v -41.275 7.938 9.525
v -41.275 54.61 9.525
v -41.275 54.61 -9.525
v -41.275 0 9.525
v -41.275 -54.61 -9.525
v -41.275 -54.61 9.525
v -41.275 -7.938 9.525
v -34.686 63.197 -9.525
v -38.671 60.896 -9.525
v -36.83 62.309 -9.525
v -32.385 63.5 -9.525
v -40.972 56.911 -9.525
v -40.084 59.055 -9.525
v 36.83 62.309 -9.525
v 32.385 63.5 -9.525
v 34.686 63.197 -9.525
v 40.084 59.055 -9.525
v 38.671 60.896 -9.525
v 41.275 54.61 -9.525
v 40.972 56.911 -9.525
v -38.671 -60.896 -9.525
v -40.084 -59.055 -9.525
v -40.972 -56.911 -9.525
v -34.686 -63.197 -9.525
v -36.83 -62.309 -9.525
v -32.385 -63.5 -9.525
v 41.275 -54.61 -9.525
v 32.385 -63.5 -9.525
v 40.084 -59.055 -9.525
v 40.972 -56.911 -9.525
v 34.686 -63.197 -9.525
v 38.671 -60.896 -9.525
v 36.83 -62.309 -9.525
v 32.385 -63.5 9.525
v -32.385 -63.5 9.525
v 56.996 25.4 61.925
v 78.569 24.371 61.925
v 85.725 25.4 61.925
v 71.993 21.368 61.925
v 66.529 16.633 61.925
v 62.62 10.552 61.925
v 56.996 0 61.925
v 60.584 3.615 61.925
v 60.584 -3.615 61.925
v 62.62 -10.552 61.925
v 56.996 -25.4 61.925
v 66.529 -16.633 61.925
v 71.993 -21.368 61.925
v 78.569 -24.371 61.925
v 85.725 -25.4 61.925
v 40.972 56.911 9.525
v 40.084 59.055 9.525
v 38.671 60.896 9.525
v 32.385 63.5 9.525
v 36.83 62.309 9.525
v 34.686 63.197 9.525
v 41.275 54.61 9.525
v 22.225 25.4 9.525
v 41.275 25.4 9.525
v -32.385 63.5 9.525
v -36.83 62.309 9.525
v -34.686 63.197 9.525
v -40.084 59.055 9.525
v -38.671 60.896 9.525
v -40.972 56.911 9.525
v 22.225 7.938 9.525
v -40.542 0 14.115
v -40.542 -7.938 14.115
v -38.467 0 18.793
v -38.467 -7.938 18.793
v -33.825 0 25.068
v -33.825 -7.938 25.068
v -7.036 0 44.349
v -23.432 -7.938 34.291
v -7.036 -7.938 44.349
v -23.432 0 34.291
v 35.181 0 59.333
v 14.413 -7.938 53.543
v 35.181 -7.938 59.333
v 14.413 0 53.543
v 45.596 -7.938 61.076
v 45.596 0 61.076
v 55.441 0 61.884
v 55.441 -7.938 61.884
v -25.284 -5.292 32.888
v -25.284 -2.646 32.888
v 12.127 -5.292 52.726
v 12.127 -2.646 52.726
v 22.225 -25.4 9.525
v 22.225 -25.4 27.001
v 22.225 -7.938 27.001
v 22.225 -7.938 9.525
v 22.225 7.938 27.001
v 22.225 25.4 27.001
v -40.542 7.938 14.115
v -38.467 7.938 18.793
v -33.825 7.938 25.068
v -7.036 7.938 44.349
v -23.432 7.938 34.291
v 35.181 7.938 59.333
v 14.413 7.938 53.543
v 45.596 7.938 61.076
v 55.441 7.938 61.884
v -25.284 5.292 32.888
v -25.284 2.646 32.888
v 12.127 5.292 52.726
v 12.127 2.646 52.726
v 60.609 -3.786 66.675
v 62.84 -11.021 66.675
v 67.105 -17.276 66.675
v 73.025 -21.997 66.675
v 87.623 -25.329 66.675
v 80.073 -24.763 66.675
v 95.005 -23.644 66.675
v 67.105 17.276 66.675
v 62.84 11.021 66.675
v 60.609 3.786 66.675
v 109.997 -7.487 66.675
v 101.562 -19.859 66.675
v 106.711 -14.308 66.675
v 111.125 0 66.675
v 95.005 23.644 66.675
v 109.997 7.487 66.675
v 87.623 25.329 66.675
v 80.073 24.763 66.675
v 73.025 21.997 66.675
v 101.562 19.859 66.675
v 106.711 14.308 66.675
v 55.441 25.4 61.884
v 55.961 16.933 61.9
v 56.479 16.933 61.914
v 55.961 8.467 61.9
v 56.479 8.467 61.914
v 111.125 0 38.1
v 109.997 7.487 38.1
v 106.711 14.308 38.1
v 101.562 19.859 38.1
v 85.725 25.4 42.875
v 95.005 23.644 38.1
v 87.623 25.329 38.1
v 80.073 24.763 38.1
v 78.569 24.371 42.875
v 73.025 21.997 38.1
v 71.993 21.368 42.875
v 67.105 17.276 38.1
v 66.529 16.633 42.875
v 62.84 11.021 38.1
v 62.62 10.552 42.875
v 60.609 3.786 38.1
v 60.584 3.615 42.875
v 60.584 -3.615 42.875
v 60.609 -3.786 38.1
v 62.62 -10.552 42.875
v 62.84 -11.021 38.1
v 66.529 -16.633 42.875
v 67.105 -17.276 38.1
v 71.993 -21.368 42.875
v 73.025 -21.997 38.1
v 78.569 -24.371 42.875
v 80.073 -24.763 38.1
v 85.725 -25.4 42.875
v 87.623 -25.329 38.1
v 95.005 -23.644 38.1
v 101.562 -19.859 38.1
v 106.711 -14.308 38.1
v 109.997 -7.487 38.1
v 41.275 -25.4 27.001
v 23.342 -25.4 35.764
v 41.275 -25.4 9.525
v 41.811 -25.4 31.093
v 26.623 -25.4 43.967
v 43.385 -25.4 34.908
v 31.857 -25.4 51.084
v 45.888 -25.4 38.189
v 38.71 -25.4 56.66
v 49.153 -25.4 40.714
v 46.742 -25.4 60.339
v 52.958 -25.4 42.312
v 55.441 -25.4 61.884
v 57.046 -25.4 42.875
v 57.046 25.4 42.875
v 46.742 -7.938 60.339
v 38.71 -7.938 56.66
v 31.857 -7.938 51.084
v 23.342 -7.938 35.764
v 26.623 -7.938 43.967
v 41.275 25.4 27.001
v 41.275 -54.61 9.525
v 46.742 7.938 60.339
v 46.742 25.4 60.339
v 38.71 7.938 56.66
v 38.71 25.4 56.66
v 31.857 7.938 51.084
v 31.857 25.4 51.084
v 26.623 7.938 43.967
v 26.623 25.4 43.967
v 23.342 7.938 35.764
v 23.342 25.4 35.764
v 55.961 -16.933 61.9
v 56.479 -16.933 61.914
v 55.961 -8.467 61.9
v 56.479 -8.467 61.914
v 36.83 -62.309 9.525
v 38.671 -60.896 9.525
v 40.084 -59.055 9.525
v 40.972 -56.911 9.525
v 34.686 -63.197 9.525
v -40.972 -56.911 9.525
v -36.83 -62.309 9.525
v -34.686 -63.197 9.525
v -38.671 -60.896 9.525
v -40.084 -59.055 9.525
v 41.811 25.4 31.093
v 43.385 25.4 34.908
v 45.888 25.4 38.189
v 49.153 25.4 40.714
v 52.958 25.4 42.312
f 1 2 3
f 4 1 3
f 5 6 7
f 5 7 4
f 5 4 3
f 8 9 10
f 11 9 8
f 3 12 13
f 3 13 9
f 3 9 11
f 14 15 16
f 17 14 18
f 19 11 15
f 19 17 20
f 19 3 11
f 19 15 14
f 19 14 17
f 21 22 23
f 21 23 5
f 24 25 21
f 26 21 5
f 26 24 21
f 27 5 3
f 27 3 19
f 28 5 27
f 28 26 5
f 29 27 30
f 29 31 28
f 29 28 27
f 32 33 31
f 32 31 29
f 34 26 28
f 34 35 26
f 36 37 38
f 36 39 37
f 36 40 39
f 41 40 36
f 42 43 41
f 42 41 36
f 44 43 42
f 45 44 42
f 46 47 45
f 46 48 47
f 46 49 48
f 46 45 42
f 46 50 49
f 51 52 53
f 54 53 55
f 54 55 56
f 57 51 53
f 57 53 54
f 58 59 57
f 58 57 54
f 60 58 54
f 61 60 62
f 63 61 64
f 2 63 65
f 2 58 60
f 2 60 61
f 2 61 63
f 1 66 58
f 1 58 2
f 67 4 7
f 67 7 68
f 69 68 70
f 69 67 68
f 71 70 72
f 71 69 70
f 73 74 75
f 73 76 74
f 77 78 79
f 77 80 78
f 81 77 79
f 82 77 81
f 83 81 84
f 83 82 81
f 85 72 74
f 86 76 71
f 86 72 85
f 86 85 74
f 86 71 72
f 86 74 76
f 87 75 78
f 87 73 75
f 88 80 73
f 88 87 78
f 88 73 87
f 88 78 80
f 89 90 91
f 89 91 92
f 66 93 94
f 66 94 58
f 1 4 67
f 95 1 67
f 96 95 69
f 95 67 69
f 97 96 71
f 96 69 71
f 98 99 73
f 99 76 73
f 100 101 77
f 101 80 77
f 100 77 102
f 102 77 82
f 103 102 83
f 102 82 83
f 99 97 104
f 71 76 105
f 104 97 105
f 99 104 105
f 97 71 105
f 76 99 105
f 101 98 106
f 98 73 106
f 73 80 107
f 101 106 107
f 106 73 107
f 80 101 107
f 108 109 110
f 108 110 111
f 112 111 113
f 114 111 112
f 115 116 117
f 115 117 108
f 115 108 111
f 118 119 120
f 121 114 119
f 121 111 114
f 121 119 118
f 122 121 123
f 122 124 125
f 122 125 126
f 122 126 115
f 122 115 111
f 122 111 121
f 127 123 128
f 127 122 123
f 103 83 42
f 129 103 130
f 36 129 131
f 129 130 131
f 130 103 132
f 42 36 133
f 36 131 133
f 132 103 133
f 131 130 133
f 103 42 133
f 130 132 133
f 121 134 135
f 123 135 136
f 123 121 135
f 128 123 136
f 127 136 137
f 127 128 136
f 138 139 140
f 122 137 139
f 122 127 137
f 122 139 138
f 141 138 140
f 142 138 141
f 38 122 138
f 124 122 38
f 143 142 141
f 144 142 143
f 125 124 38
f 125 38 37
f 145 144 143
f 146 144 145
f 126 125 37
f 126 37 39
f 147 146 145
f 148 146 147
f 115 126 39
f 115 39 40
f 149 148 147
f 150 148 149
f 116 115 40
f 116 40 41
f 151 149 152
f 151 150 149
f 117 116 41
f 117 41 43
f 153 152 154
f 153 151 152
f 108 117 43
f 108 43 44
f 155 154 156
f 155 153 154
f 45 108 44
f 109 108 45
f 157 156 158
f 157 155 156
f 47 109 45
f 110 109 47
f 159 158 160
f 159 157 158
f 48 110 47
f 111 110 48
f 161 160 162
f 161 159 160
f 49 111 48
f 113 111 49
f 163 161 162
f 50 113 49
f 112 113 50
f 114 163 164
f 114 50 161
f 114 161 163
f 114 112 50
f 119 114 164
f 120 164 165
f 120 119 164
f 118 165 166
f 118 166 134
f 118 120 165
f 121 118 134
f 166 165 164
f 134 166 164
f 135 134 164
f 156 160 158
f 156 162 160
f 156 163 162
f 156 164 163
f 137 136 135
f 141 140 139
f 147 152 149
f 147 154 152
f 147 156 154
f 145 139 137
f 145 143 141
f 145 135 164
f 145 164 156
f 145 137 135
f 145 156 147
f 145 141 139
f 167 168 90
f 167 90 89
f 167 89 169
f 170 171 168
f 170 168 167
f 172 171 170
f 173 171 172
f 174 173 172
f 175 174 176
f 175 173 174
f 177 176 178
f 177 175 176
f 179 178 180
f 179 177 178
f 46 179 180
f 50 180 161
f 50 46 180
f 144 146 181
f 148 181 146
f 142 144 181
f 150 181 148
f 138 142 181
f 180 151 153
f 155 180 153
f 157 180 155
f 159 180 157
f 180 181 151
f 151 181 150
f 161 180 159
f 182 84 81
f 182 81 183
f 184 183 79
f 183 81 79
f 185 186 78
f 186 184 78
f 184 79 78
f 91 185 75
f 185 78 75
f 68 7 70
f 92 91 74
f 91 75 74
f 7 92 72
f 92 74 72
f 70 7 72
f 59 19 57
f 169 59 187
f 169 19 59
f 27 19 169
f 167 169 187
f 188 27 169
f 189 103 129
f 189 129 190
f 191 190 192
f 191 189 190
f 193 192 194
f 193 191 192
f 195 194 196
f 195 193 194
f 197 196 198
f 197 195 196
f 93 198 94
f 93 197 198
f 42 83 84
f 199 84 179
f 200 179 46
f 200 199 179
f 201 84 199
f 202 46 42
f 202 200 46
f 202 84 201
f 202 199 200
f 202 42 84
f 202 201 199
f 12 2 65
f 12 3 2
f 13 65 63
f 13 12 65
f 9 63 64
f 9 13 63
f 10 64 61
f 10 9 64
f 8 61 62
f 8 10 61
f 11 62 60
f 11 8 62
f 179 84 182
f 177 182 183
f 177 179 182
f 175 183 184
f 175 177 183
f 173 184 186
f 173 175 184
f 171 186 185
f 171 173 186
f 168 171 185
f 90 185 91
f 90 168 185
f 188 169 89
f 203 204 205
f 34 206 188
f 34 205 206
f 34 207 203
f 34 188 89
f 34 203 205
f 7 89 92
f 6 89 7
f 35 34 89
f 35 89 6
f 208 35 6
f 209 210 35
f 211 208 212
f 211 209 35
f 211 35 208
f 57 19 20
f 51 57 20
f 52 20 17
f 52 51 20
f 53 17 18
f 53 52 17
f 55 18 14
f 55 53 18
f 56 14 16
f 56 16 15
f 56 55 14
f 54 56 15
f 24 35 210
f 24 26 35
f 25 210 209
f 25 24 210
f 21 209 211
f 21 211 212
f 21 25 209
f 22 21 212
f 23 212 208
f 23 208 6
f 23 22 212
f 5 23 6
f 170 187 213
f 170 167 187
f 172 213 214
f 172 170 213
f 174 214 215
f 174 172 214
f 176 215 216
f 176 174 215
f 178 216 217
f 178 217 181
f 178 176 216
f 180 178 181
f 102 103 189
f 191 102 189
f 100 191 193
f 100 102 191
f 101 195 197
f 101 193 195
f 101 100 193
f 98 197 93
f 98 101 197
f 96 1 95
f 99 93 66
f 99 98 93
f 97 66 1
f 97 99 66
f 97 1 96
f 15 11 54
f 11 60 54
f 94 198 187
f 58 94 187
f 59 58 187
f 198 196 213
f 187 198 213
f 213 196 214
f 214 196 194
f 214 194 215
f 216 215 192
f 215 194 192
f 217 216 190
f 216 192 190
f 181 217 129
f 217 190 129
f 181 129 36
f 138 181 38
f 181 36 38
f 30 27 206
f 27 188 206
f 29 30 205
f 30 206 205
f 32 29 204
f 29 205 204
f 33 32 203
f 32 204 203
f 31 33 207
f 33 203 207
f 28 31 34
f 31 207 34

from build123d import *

# Parameters (mm, degrees)
F1_DEPTH = 63.5
F0_W     = 25.4
F0_H     = 19.05
F2_DEPTH = 25.4
F3_DEPTH = 7.9375
F5_R     = 8.89


with BuildPart() as f1:
    # F0 (on Front) → F1 (new body, symmetric)
    with BuildSketch(Plane.XZ):
        Polygon((-41.275, 9.525), (-41.275, -9.525), (41.275, -9.525), (41.275, 9.525), (22.225, 9.525), align=None)
    extrude(amount=F1_DEPTH, both=True)

    # F0 (on Front) → F2 (join, symmetric)
    with BuildSketch(Plane.XZ):
        with Locations((73.025, 52.4002)):
            Rectangle(F0_W, F0_H)
        with BuildLine():
            Line((22.225, 9.525), (41.275, 9.525))
            Line((41.275, 9.525), (41.275, 27.0005395917))
            ThreePointArc((41.275, 27.0005395917), (45.8880281066, 38.1890879368), (57.0461639775, 42.8752))
            Line((57.0461639775, 42.8752), (60.325, 42.8752))
            Line((60.325, 42.8752), (60.325, 61.9252))
            Line((60.325, 61.9252), (56.9959858401, 61.9252))
            add(Edge.make_bspline(
                [(55.4406243802, 61.8836825118), (55.9614433342, 61.9018413626), (56.4799445563, 61.9157023789), (56.9959858401, 61.9252)],
                knots=[109.9747025798, 109.9747025798, 109.9747025798, 109.9747025798, 111.3686114577, 111.3686114577, 111.3686114577, 111.3686114577], degree=3))
            ThreePointArc((55.4406243802, 61.8836825118), (31.8571594268, 51.0843067542), (22.225, 27.0005395917))
            Line((22.225, 27.0005395917), (22.225, 9.525))
        make_face()
    extrude(amount=F2_DEPTH, both=True)

    # F0 (on Front) → F3 (join, symmetric)
    with BuildSketch(Plane.XZ):
        with BuildLine():
            add(Edge.make_bspline(
                [(-41.275, 9.525), (-41.168221459, 32.2657067872), (14.3497679594, 60.4510105174), (55.4406243802, 61.8836825118)],
                knots=[0, 0, 0, 0, 109.9747025798, 109.9747025798, 109.9747025798, 109.9747025798], degree=3))
            Line((-41.275, 9.525), (22.225, 9.525))
            Line((22.225, 9.525), (22.225, 27.0005395917))
            ThreePointArc((22.225, 27.0005395917), (31.8571594268, 51.0843067542), (55.4406243802, 61.8836825118))
        make_face()
    extrude(amount=F3_DEPTH, both=True)

    # F0 (on Front) → F4 (revolve)
    with BuildSketch(Plane.XZ):
        Polygon((85.725, 66.675), (85.725, 61.9252), (85.725, 42.8752), (85.725, 38.1), (111.125, 38.1), (111.125, 66.675), align=None)
    revolve(axis=Axis((85.725, 0, 52.3875), (0, 0, 1)))

    # F5
    f5_edges = [f1.edges().sort_by_distance(p)[0] for p in [
        (-41.275, -63.5, 0),
        (41.275, -63.5, 0),
        (41.275, 63.5, 0),
        (-41.275, 63.5, 0),
    ]]
    fillet(f5_edges, radius=F5_R)


solid = f1.part
